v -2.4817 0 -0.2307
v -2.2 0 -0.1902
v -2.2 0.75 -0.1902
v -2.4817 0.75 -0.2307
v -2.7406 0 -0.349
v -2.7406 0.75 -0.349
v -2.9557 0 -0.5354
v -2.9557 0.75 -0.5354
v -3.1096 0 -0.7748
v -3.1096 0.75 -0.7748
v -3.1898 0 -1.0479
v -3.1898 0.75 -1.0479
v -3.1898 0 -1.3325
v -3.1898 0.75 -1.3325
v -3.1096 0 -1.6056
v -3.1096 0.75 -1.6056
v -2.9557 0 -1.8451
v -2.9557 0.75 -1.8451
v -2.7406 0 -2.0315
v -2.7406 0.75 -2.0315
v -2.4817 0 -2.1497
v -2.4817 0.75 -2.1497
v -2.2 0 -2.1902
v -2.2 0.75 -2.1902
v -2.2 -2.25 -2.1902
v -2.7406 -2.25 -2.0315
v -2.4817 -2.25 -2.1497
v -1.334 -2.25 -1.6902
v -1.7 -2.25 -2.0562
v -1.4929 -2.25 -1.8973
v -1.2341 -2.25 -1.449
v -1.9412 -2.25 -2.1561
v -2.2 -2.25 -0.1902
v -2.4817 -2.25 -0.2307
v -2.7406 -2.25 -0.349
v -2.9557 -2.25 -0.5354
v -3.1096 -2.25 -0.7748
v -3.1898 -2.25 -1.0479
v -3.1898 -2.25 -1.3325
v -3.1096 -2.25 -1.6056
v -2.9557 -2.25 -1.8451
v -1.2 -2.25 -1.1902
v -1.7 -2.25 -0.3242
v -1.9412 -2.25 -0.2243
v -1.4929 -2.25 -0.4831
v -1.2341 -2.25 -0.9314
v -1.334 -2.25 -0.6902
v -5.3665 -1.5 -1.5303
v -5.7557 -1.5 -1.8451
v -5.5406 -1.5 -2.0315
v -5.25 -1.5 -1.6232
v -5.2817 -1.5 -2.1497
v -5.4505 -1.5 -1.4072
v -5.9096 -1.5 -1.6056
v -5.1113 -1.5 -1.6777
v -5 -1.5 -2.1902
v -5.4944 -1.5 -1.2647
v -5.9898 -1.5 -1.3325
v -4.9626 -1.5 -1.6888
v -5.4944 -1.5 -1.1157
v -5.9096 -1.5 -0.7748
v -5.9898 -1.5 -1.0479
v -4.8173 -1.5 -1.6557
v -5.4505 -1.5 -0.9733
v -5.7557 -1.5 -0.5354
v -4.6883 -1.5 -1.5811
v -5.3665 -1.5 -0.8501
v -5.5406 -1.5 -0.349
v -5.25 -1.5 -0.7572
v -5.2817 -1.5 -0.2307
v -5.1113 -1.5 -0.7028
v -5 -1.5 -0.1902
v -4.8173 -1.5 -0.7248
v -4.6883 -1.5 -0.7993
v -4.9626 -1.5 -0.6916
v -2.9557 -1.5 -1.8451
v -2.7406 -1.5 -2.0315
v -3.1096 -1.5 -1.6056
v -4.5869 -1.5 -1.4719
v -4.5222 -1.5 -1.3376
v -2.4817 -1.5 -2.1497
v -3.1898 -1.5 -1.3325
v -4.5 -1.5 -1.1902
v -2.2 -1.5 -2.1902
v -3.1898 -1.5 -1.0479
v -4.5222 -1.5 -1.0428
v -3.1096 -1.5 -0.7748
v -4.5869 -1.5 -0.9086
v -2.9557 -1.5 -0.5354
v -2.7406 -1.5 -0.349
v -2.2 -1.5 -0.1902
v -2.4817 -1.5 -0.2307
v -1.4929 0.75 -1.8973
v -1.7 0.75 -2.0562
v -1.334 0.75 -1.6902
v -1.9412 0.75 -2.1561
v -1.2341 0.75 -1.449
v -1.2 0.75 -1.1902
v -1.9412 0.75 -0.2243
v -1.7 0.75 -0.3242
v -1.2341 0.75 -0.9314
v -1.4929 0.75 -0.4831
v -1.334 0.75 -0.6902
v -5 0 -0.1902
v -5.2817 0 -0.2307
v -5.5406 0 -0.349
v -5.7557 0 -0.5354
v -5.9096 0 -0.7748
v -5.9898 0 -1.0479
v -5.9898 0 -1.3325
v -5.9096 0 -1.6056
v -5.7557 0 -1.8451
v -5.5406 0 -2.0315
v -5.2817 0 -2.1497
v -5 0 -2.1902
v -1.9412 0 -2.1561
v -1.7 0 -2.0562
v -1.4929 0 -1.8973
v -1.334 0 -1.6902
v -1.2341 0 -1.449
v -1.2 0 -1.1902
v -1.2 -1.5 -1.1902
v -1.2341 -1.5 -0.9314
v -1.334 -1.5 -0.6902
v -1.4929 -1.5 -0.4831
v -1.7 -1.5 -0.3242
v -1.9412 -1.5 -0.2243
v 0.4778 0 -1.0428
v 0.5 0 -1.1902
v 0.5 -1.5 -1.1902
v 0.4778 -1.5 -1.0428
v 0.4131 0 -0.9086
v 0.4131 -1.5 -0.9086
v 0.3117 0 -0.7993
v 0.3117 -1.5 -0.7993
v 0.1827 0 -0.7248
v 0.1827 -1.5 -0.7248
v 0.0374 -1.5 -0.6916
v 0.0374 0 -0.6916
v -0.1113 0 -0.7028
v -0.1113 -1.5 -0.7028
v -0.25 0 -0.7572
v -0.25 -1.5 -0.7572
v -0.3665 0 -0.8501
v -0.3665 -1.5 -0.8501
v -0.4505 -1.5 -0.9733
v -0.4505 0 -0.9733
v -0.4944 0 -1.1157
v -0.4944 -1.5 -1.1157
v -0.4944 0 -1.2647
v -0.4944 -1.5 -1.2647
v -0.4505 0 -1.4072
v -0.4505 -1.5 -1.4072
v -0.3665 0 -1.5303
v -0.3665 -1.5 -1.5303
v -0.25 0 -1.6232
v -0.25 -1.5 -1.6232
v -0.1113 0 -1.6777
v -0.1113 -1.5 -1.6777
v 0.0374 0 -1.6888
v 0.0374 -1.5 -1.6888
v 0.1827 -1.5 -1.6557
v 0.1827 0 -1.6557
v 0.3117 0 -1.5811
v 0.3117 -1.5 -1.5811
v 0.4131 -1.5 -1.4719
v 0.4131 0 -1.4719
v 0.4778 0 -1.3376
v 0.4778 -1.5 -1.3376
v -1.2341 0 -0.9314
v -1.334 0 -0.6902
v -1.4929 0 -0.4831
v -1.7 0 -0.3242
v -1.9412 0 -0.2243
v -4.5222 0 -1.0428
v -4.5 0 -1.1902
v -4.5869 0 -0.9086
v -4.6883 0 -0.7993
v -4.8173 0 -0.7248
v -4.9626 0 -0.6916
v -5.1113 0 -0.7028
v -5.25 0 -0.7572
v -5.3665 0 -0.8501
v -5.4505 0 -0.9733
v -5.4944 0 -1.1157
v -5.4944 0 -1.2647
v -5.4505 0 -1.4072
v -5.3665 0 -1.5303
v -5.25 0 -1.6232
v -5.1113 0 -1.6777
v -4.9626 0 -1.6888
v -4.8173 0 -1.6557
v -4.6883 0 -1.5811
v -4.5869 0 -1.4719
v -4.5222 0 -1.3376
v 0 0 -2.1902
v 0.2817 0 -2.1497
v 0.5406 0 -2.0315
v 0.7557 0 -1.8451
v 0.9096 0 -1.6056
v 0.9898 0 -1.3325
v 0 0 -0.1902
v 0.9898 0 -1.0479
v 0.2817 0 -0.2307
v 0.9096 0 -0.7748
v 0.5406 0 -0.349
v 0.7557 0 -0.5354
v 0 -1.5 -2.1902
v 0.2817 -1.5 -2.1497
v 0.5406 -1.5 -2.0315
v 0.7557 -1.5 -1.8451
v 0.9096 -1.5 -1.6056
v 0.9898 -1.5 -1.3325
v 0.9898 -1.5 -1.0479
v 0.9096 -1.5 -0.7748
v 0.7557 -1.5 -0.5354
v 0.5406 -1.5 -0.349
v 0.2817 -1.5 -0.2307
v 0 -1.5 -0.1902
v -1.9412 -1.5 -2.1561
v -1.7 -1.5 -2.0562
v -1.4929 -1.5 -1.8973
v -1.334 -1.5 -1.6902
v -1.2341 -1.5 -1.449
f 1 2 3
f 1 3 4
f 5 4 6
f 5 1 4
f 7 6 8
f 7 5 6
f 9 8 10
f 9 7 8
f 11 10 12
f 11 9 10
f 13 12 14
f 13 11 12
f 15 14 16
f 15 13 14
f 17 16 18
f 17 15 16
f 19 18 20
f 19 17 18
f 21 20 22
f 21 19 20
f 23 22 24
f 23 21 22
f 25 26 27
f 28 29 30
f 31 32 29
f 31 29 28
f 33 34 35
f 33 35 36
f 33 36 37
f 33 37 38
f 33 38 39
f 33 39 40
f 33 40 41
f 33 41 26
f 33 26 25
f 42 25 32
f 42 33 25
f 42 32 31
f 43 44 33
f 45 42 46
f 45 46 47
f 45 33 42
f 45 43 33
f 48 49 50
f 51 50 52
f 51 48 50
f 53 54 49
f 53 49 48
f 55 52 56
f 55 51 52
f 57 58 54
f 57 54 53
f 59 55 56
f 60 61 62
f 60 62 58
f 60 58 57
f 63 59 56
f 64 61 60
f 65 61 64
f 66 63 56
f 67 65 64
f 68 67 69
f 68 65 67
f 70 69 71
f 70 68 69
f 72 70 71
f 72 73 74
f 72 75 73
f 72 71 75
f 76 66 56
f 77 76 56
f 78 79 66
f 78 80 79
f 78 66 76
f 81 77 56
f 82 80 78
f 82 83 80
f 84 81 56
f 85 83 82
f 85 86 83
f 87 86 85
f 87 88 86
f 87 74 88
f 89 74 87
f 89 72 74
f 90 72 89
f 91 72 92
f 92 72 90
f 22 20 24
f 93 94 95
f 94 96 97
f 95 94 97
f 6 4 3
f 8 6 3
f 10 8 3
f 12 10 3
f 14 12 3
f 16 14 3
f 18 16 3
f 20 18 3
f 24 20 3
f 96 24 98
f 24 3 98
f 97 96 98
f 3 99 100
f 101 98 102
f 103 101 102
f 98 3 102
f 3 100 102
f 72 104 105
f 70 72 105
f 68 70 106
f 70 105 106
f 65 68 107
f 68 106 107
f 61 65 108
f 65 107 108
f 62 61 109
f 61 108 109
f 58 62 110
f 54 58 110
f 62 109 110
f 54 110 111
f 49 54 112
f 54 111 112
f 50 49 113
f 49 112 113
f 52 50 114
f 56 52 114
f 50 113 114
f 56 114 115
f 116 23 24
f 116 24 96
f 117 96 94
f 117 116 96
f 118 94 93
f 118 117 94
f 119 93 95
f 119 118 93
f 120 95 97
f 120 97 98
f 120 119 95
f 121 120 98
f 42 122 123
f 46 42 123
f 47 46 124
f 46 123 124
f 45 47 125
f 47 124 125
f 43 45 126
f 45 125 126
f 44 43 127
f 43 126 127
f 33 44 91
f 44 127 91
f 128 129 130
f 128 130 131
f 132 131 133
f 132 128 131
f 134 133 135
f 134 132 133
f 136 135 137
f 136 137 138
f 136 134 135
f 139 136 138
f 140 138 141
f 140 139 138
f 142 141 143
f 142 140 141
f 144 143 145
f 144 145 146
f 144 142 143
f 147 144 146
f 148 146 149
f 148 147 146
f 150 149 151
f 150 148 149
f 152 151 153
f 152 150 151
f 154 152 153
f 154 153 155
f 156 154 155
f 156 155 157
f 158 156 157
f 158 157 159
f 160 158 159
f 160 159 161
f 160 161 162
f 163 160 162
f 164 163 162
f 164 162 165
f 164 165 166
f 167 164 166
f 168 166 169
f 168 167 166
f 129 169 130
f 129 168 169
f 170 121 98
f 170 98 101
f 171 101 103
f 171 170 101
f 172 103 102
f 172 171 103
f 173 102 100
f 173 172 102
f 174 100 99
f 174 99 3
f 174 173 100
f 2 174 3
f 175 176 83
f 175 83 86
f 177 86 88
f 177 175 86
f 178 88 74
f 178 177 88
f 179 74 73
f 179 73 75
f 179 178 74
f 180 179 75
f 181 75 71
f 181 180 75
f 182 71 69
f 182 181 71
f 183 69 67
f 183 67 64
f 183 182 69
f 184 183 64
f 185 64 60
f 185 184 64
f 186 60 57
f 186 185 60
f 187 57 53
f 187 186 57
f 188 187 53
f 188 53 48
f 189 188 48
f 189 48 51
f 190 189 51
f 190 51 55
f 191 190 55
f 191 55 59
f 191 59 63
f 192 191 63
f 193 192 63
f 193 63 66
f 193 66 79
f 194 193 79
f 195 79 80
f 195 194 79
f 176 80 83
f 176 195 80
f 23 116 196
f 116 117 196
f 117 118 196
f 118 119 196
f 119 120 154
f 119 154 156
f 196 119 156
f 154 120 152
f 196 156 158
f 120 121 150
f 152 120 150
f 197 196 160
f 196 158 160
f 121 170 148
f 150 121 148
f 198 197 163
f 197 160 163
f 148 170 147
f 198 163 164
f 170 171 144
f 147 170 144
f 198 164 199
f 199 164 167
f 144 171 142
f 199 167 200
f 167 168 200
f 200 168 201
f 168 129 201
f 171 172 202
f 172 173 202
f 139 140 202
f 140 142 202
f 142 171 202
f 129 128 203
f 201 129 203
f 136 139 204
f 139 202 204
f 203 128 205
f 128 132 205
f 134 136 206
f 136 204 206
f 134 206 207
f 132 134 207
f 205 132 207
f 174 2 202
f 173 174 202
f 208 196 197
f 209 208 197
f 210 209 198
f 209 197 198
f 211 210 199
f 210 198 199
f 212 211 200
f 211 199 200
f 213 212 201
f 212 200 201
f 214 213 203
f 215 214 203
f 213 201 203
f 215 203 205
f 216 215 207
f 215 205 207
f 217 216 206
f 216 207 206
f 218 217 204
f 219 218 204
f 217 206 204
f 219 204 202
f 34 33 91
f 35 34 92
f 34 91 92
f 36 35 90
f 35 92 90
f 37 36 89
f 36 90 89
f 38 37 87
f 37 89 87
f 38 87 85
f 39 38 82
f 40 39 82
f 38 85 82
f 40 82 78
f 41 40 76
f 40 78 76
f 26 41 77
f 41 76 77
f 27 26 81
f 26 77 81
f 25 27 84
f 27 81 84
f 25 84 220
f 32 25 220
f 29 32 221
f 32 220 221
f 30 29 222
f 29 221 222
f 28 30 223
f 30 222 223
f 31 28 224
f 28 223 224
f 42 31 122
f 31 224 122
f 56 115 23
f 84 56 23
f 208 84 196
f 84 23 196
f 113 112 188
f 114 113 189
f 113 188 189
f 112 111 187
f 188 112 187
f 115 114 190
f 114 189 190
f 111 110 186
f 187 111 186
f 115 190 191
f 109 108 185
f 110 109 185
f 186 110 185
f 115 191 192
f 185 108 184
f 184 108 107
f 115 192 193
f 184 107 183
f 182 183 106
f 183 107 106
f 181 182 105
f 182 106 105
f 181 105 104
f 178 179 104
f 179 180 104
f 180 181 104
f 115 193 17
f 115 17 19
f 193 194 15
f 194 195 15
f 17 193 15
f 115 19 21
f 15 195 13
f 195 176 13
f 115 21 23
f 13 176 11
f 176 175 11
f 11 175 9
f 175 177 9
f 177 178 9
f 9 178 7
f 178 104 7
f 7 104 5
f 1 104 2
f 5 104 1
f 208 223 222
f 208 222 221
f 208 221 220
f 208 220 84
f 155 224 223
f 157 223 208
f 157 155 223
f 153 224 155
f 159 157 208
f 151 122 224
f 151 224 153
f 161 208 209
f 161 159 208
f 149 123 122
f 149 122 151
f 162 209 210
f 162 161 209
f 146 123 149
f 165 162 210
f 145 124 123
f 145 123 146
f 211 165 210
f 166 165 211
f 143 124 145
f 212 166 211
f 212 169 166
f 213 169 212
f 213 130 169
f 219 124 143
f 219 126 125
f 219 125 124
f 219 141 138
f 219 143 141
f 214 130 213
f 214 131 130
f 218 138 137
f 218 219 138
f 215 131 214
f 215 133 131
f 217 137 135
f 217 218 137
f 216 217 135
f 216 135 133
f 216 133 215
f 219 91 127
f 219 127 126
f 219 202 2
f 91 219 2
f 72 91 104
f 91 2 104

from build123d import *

# Parameters (mm, degrees)
F0_R          = 0.5
F1_DEPTH      = 1.5
F2_DEPTH      = 0.75
F2_DEPTH_BACK = 2.25


# Not quite as in the source:
# - a feature names something its author has since deleted; it is built from what else it names


with BuildPart() as f1:
    # F0 (on Front) → F1 (new body)
    with BuildSketch(Plane.XZ):
        with BuildLine():
            ThreePointArc((-2.2, -2.1902196236), (-3.2, -1.1902196236), (-2.2, -0.1902196236))
            Line((-2.2, -0.1902196236), (-2.8, -0.1902196236))
            ThreePointArc((-2.8, -0.1902196236), (-3.8, -1.1902196236), (-2.8, -2.1902196236))
            Line((-2.8, -2.1902196236), (-2.2, -2.1902196236))
        make_face()
        with BuildLine():
            Line((0, -0.1902196236), (-2.2, -0.1902196236))
            ThreePointArc((-2.2, -0.1902196236), (-1.4928932188, -0.4831128424), (-1.2, -1.1902196236))
            ThreePointArc((-1.2, -1.1902196236), (-1.4928932188, -1.8973264048), (-2.2, -2.1902196236))
            Line((-2.2, -2.1902196236), (0, -2.1902196236))
            ThreePointArc((0, -2.1902196236), (1, -1.1902196236), (0, -0.1902196236))
        make_face()
        with Locations((0, -1.1902196236)):
            Circle(F0_R, mode=Mode.SUBTRACT)
        with BuildLine():
            ThreePointArc((-2.8, -2.1902196236), (-3.8, -1.1902196236), (-2.8, -0.1902196236))
            Line((-2.8, -0.1902196236), (-5, -0.1902196236))
            ThreePointArc((-5, -0.1902196236), (-6, -1.1902196236), (-5, -2.1902196236))
            Line((-5, -2.1902196236), (-2.8, -2.1902196236))
        make_face()
        with Locations((-5, -1.1902196236)):
            Circle(F0_R, mode=Mode.SUBTRACT)
        with BuildLine():
            ThreePointArc((-1.2, -1.1902196236), (-1.4928932188, -0.4831128424), (-2.2, -0.1902196236))
            ThreePointArc((-2.2, -0.1902196236), (-3.2, -1.1902196236), (-2.2, -2.1902196236))
            ThreePointArc((-2.2, -2.1902196236), (-1.4928932188, -1.8973264048), (-1.2, -1.1902196236))
        make_face()
    extrude(amount=F1_DEPTH)

    # F0 (on Front) → F2 (join, two sides)
    with BuildSketch(Plane.XZ) as f2_sk:
        with BuildLine():
            ThreePointArc((-1.2, -1.1902196236), (-1.4928932188, -0.4831128424), (-2.2, -0.1902196236))
            ThreePointArc((-2.2, -0.1902196236), (-3.2, -1.1902196236), (-2.2, -2.1902196236))
            ThreePointArc((-2.2, -2.1902196236), (-1.4928932188, -1.8973264048), (-1.2, -1.1902196236))
        make_face()
    extrude(amount=-F2_DEPTH)
    extrude(f2_sk.sketch, amount=F2_DEPTH_BACK)


solid = f1.part
